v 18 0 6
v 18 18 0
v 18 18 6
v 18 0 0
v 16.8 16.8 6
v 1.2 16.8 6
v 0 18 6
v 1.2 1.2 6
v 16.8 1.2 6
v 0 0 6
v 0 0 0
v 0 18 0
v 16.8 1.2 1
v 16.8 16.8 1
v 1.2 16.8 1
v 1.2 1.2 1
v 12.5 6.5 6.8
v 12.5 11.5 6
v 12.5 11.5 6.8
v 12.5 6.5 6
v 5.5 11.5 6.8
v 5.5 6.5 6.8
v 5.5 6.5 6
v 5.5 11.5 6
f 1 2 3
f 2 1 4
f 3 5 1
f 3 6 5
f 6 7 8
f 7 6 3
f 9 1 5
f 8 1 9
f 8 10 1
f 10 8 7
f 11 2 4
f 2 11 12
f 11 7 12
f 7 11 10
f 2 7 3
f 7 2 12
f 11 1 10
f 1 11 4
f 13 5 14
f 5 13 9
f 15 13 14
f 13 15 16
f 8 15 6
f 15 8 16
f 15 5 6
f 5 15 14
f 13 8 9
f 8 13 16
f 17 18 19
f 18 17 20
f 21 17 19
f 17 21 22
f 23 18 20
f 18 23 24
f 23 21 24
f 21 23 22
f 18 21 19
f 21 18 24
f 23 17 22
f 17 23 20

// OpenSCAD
// Minimum runtime smoke sample for browser-side OpenSCAD validation.
// This sample intentionally avoids font dependencies so the runtime can
// be checked independently from `text()` and bundled font assets.

body_width = 18;
body_depth = 18;
body_height = 6;
legend_height = 0.8;

module body() {
    difference() {
        cube([body_width, body_depth, body_height], center = false);
        translate([1.2, 1.2, 1.0])
            cube([body_width - 2.4, body_depth - 2.4, body_height], center = false);
    }
}

module legend() {
    translate([5.5, 6.5, body_height])
        cube([7.0, 5.0, legend_height], center = false);
}

body();
legend();
